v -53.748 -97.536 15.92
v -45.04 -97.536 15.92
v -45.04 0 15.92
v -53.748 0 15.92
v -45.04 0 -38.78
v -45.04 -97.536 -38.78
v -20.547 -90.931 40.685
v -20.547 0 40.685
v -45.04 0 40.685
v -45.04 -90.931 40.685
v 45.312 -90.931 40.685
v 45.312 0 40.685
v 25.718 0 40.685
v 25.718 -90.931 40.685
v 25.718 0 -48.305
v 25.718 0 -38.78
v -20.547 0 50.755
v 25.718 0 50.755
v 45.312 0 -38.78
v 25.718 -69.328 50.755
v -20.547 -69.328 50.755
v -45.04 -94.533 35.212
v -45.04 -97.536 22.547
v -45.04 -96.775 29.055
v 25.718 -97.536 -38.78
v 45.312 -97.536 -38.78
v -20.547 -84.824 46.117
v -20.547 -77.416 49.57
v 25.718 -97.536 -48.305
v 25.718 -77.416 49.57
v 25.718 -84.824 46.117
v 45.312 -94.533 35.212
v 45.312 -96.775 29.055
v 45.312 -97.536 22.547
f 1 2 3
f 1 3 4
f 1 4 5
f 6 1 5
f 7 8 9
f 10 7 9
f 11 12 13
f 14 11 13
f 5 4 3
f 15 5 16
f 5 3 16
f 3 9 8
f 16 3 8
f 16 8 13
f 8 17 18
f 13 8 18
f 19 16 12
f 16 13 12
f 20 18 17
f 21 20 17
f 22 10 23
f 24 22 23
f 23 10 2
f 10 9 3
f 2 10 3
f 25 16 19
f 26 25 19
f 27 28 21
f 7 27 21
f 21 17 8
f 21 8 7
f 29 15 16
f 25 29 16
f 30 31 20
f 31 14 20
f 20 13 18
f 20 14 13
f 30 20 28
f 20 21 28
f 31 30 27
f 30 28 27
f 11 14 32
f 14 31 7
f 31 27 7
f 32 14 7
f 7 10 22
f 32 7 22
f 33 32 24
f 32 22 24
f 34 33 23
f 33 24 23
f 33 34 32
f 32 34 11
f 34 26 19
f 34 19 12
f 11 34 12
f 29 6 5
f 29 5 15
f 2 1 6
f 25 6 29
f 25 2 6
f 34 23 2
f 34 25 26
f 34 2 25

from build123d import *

# Parameters (mm, degrees)
F1_DEPTH = 97.536
F2_R     = 28.207671


with BuildPart() as f1:
    # F0 (on Front) → F1 (new body)
    with BuildSketch(Plane.XZ):
        Polygon((-20.546786, 40.685356), (-45.039643, 40.685356), (-45.039643, 15.920358), (-53.748216, 15.920358), (-45.039643, -38.780358), (25.717502, -48.305355), (25.717502, -38.780358), (45.311786, -38.780358), (45.311786, 40.685356), (25.717502, 40.685356), (25.717502, 50.754644), (-20.546786, 50.754644), align=None)
    extrude(amount=F1_DEPTH)

    # F2
    f2_edges = [f1.edges().sort_by_distance(p)[0] for p in [
        (2.585358, -97.536, 50.754644),
    ]]
    fillet(f2_edges, radius=F2_R)


solid = f1.part
